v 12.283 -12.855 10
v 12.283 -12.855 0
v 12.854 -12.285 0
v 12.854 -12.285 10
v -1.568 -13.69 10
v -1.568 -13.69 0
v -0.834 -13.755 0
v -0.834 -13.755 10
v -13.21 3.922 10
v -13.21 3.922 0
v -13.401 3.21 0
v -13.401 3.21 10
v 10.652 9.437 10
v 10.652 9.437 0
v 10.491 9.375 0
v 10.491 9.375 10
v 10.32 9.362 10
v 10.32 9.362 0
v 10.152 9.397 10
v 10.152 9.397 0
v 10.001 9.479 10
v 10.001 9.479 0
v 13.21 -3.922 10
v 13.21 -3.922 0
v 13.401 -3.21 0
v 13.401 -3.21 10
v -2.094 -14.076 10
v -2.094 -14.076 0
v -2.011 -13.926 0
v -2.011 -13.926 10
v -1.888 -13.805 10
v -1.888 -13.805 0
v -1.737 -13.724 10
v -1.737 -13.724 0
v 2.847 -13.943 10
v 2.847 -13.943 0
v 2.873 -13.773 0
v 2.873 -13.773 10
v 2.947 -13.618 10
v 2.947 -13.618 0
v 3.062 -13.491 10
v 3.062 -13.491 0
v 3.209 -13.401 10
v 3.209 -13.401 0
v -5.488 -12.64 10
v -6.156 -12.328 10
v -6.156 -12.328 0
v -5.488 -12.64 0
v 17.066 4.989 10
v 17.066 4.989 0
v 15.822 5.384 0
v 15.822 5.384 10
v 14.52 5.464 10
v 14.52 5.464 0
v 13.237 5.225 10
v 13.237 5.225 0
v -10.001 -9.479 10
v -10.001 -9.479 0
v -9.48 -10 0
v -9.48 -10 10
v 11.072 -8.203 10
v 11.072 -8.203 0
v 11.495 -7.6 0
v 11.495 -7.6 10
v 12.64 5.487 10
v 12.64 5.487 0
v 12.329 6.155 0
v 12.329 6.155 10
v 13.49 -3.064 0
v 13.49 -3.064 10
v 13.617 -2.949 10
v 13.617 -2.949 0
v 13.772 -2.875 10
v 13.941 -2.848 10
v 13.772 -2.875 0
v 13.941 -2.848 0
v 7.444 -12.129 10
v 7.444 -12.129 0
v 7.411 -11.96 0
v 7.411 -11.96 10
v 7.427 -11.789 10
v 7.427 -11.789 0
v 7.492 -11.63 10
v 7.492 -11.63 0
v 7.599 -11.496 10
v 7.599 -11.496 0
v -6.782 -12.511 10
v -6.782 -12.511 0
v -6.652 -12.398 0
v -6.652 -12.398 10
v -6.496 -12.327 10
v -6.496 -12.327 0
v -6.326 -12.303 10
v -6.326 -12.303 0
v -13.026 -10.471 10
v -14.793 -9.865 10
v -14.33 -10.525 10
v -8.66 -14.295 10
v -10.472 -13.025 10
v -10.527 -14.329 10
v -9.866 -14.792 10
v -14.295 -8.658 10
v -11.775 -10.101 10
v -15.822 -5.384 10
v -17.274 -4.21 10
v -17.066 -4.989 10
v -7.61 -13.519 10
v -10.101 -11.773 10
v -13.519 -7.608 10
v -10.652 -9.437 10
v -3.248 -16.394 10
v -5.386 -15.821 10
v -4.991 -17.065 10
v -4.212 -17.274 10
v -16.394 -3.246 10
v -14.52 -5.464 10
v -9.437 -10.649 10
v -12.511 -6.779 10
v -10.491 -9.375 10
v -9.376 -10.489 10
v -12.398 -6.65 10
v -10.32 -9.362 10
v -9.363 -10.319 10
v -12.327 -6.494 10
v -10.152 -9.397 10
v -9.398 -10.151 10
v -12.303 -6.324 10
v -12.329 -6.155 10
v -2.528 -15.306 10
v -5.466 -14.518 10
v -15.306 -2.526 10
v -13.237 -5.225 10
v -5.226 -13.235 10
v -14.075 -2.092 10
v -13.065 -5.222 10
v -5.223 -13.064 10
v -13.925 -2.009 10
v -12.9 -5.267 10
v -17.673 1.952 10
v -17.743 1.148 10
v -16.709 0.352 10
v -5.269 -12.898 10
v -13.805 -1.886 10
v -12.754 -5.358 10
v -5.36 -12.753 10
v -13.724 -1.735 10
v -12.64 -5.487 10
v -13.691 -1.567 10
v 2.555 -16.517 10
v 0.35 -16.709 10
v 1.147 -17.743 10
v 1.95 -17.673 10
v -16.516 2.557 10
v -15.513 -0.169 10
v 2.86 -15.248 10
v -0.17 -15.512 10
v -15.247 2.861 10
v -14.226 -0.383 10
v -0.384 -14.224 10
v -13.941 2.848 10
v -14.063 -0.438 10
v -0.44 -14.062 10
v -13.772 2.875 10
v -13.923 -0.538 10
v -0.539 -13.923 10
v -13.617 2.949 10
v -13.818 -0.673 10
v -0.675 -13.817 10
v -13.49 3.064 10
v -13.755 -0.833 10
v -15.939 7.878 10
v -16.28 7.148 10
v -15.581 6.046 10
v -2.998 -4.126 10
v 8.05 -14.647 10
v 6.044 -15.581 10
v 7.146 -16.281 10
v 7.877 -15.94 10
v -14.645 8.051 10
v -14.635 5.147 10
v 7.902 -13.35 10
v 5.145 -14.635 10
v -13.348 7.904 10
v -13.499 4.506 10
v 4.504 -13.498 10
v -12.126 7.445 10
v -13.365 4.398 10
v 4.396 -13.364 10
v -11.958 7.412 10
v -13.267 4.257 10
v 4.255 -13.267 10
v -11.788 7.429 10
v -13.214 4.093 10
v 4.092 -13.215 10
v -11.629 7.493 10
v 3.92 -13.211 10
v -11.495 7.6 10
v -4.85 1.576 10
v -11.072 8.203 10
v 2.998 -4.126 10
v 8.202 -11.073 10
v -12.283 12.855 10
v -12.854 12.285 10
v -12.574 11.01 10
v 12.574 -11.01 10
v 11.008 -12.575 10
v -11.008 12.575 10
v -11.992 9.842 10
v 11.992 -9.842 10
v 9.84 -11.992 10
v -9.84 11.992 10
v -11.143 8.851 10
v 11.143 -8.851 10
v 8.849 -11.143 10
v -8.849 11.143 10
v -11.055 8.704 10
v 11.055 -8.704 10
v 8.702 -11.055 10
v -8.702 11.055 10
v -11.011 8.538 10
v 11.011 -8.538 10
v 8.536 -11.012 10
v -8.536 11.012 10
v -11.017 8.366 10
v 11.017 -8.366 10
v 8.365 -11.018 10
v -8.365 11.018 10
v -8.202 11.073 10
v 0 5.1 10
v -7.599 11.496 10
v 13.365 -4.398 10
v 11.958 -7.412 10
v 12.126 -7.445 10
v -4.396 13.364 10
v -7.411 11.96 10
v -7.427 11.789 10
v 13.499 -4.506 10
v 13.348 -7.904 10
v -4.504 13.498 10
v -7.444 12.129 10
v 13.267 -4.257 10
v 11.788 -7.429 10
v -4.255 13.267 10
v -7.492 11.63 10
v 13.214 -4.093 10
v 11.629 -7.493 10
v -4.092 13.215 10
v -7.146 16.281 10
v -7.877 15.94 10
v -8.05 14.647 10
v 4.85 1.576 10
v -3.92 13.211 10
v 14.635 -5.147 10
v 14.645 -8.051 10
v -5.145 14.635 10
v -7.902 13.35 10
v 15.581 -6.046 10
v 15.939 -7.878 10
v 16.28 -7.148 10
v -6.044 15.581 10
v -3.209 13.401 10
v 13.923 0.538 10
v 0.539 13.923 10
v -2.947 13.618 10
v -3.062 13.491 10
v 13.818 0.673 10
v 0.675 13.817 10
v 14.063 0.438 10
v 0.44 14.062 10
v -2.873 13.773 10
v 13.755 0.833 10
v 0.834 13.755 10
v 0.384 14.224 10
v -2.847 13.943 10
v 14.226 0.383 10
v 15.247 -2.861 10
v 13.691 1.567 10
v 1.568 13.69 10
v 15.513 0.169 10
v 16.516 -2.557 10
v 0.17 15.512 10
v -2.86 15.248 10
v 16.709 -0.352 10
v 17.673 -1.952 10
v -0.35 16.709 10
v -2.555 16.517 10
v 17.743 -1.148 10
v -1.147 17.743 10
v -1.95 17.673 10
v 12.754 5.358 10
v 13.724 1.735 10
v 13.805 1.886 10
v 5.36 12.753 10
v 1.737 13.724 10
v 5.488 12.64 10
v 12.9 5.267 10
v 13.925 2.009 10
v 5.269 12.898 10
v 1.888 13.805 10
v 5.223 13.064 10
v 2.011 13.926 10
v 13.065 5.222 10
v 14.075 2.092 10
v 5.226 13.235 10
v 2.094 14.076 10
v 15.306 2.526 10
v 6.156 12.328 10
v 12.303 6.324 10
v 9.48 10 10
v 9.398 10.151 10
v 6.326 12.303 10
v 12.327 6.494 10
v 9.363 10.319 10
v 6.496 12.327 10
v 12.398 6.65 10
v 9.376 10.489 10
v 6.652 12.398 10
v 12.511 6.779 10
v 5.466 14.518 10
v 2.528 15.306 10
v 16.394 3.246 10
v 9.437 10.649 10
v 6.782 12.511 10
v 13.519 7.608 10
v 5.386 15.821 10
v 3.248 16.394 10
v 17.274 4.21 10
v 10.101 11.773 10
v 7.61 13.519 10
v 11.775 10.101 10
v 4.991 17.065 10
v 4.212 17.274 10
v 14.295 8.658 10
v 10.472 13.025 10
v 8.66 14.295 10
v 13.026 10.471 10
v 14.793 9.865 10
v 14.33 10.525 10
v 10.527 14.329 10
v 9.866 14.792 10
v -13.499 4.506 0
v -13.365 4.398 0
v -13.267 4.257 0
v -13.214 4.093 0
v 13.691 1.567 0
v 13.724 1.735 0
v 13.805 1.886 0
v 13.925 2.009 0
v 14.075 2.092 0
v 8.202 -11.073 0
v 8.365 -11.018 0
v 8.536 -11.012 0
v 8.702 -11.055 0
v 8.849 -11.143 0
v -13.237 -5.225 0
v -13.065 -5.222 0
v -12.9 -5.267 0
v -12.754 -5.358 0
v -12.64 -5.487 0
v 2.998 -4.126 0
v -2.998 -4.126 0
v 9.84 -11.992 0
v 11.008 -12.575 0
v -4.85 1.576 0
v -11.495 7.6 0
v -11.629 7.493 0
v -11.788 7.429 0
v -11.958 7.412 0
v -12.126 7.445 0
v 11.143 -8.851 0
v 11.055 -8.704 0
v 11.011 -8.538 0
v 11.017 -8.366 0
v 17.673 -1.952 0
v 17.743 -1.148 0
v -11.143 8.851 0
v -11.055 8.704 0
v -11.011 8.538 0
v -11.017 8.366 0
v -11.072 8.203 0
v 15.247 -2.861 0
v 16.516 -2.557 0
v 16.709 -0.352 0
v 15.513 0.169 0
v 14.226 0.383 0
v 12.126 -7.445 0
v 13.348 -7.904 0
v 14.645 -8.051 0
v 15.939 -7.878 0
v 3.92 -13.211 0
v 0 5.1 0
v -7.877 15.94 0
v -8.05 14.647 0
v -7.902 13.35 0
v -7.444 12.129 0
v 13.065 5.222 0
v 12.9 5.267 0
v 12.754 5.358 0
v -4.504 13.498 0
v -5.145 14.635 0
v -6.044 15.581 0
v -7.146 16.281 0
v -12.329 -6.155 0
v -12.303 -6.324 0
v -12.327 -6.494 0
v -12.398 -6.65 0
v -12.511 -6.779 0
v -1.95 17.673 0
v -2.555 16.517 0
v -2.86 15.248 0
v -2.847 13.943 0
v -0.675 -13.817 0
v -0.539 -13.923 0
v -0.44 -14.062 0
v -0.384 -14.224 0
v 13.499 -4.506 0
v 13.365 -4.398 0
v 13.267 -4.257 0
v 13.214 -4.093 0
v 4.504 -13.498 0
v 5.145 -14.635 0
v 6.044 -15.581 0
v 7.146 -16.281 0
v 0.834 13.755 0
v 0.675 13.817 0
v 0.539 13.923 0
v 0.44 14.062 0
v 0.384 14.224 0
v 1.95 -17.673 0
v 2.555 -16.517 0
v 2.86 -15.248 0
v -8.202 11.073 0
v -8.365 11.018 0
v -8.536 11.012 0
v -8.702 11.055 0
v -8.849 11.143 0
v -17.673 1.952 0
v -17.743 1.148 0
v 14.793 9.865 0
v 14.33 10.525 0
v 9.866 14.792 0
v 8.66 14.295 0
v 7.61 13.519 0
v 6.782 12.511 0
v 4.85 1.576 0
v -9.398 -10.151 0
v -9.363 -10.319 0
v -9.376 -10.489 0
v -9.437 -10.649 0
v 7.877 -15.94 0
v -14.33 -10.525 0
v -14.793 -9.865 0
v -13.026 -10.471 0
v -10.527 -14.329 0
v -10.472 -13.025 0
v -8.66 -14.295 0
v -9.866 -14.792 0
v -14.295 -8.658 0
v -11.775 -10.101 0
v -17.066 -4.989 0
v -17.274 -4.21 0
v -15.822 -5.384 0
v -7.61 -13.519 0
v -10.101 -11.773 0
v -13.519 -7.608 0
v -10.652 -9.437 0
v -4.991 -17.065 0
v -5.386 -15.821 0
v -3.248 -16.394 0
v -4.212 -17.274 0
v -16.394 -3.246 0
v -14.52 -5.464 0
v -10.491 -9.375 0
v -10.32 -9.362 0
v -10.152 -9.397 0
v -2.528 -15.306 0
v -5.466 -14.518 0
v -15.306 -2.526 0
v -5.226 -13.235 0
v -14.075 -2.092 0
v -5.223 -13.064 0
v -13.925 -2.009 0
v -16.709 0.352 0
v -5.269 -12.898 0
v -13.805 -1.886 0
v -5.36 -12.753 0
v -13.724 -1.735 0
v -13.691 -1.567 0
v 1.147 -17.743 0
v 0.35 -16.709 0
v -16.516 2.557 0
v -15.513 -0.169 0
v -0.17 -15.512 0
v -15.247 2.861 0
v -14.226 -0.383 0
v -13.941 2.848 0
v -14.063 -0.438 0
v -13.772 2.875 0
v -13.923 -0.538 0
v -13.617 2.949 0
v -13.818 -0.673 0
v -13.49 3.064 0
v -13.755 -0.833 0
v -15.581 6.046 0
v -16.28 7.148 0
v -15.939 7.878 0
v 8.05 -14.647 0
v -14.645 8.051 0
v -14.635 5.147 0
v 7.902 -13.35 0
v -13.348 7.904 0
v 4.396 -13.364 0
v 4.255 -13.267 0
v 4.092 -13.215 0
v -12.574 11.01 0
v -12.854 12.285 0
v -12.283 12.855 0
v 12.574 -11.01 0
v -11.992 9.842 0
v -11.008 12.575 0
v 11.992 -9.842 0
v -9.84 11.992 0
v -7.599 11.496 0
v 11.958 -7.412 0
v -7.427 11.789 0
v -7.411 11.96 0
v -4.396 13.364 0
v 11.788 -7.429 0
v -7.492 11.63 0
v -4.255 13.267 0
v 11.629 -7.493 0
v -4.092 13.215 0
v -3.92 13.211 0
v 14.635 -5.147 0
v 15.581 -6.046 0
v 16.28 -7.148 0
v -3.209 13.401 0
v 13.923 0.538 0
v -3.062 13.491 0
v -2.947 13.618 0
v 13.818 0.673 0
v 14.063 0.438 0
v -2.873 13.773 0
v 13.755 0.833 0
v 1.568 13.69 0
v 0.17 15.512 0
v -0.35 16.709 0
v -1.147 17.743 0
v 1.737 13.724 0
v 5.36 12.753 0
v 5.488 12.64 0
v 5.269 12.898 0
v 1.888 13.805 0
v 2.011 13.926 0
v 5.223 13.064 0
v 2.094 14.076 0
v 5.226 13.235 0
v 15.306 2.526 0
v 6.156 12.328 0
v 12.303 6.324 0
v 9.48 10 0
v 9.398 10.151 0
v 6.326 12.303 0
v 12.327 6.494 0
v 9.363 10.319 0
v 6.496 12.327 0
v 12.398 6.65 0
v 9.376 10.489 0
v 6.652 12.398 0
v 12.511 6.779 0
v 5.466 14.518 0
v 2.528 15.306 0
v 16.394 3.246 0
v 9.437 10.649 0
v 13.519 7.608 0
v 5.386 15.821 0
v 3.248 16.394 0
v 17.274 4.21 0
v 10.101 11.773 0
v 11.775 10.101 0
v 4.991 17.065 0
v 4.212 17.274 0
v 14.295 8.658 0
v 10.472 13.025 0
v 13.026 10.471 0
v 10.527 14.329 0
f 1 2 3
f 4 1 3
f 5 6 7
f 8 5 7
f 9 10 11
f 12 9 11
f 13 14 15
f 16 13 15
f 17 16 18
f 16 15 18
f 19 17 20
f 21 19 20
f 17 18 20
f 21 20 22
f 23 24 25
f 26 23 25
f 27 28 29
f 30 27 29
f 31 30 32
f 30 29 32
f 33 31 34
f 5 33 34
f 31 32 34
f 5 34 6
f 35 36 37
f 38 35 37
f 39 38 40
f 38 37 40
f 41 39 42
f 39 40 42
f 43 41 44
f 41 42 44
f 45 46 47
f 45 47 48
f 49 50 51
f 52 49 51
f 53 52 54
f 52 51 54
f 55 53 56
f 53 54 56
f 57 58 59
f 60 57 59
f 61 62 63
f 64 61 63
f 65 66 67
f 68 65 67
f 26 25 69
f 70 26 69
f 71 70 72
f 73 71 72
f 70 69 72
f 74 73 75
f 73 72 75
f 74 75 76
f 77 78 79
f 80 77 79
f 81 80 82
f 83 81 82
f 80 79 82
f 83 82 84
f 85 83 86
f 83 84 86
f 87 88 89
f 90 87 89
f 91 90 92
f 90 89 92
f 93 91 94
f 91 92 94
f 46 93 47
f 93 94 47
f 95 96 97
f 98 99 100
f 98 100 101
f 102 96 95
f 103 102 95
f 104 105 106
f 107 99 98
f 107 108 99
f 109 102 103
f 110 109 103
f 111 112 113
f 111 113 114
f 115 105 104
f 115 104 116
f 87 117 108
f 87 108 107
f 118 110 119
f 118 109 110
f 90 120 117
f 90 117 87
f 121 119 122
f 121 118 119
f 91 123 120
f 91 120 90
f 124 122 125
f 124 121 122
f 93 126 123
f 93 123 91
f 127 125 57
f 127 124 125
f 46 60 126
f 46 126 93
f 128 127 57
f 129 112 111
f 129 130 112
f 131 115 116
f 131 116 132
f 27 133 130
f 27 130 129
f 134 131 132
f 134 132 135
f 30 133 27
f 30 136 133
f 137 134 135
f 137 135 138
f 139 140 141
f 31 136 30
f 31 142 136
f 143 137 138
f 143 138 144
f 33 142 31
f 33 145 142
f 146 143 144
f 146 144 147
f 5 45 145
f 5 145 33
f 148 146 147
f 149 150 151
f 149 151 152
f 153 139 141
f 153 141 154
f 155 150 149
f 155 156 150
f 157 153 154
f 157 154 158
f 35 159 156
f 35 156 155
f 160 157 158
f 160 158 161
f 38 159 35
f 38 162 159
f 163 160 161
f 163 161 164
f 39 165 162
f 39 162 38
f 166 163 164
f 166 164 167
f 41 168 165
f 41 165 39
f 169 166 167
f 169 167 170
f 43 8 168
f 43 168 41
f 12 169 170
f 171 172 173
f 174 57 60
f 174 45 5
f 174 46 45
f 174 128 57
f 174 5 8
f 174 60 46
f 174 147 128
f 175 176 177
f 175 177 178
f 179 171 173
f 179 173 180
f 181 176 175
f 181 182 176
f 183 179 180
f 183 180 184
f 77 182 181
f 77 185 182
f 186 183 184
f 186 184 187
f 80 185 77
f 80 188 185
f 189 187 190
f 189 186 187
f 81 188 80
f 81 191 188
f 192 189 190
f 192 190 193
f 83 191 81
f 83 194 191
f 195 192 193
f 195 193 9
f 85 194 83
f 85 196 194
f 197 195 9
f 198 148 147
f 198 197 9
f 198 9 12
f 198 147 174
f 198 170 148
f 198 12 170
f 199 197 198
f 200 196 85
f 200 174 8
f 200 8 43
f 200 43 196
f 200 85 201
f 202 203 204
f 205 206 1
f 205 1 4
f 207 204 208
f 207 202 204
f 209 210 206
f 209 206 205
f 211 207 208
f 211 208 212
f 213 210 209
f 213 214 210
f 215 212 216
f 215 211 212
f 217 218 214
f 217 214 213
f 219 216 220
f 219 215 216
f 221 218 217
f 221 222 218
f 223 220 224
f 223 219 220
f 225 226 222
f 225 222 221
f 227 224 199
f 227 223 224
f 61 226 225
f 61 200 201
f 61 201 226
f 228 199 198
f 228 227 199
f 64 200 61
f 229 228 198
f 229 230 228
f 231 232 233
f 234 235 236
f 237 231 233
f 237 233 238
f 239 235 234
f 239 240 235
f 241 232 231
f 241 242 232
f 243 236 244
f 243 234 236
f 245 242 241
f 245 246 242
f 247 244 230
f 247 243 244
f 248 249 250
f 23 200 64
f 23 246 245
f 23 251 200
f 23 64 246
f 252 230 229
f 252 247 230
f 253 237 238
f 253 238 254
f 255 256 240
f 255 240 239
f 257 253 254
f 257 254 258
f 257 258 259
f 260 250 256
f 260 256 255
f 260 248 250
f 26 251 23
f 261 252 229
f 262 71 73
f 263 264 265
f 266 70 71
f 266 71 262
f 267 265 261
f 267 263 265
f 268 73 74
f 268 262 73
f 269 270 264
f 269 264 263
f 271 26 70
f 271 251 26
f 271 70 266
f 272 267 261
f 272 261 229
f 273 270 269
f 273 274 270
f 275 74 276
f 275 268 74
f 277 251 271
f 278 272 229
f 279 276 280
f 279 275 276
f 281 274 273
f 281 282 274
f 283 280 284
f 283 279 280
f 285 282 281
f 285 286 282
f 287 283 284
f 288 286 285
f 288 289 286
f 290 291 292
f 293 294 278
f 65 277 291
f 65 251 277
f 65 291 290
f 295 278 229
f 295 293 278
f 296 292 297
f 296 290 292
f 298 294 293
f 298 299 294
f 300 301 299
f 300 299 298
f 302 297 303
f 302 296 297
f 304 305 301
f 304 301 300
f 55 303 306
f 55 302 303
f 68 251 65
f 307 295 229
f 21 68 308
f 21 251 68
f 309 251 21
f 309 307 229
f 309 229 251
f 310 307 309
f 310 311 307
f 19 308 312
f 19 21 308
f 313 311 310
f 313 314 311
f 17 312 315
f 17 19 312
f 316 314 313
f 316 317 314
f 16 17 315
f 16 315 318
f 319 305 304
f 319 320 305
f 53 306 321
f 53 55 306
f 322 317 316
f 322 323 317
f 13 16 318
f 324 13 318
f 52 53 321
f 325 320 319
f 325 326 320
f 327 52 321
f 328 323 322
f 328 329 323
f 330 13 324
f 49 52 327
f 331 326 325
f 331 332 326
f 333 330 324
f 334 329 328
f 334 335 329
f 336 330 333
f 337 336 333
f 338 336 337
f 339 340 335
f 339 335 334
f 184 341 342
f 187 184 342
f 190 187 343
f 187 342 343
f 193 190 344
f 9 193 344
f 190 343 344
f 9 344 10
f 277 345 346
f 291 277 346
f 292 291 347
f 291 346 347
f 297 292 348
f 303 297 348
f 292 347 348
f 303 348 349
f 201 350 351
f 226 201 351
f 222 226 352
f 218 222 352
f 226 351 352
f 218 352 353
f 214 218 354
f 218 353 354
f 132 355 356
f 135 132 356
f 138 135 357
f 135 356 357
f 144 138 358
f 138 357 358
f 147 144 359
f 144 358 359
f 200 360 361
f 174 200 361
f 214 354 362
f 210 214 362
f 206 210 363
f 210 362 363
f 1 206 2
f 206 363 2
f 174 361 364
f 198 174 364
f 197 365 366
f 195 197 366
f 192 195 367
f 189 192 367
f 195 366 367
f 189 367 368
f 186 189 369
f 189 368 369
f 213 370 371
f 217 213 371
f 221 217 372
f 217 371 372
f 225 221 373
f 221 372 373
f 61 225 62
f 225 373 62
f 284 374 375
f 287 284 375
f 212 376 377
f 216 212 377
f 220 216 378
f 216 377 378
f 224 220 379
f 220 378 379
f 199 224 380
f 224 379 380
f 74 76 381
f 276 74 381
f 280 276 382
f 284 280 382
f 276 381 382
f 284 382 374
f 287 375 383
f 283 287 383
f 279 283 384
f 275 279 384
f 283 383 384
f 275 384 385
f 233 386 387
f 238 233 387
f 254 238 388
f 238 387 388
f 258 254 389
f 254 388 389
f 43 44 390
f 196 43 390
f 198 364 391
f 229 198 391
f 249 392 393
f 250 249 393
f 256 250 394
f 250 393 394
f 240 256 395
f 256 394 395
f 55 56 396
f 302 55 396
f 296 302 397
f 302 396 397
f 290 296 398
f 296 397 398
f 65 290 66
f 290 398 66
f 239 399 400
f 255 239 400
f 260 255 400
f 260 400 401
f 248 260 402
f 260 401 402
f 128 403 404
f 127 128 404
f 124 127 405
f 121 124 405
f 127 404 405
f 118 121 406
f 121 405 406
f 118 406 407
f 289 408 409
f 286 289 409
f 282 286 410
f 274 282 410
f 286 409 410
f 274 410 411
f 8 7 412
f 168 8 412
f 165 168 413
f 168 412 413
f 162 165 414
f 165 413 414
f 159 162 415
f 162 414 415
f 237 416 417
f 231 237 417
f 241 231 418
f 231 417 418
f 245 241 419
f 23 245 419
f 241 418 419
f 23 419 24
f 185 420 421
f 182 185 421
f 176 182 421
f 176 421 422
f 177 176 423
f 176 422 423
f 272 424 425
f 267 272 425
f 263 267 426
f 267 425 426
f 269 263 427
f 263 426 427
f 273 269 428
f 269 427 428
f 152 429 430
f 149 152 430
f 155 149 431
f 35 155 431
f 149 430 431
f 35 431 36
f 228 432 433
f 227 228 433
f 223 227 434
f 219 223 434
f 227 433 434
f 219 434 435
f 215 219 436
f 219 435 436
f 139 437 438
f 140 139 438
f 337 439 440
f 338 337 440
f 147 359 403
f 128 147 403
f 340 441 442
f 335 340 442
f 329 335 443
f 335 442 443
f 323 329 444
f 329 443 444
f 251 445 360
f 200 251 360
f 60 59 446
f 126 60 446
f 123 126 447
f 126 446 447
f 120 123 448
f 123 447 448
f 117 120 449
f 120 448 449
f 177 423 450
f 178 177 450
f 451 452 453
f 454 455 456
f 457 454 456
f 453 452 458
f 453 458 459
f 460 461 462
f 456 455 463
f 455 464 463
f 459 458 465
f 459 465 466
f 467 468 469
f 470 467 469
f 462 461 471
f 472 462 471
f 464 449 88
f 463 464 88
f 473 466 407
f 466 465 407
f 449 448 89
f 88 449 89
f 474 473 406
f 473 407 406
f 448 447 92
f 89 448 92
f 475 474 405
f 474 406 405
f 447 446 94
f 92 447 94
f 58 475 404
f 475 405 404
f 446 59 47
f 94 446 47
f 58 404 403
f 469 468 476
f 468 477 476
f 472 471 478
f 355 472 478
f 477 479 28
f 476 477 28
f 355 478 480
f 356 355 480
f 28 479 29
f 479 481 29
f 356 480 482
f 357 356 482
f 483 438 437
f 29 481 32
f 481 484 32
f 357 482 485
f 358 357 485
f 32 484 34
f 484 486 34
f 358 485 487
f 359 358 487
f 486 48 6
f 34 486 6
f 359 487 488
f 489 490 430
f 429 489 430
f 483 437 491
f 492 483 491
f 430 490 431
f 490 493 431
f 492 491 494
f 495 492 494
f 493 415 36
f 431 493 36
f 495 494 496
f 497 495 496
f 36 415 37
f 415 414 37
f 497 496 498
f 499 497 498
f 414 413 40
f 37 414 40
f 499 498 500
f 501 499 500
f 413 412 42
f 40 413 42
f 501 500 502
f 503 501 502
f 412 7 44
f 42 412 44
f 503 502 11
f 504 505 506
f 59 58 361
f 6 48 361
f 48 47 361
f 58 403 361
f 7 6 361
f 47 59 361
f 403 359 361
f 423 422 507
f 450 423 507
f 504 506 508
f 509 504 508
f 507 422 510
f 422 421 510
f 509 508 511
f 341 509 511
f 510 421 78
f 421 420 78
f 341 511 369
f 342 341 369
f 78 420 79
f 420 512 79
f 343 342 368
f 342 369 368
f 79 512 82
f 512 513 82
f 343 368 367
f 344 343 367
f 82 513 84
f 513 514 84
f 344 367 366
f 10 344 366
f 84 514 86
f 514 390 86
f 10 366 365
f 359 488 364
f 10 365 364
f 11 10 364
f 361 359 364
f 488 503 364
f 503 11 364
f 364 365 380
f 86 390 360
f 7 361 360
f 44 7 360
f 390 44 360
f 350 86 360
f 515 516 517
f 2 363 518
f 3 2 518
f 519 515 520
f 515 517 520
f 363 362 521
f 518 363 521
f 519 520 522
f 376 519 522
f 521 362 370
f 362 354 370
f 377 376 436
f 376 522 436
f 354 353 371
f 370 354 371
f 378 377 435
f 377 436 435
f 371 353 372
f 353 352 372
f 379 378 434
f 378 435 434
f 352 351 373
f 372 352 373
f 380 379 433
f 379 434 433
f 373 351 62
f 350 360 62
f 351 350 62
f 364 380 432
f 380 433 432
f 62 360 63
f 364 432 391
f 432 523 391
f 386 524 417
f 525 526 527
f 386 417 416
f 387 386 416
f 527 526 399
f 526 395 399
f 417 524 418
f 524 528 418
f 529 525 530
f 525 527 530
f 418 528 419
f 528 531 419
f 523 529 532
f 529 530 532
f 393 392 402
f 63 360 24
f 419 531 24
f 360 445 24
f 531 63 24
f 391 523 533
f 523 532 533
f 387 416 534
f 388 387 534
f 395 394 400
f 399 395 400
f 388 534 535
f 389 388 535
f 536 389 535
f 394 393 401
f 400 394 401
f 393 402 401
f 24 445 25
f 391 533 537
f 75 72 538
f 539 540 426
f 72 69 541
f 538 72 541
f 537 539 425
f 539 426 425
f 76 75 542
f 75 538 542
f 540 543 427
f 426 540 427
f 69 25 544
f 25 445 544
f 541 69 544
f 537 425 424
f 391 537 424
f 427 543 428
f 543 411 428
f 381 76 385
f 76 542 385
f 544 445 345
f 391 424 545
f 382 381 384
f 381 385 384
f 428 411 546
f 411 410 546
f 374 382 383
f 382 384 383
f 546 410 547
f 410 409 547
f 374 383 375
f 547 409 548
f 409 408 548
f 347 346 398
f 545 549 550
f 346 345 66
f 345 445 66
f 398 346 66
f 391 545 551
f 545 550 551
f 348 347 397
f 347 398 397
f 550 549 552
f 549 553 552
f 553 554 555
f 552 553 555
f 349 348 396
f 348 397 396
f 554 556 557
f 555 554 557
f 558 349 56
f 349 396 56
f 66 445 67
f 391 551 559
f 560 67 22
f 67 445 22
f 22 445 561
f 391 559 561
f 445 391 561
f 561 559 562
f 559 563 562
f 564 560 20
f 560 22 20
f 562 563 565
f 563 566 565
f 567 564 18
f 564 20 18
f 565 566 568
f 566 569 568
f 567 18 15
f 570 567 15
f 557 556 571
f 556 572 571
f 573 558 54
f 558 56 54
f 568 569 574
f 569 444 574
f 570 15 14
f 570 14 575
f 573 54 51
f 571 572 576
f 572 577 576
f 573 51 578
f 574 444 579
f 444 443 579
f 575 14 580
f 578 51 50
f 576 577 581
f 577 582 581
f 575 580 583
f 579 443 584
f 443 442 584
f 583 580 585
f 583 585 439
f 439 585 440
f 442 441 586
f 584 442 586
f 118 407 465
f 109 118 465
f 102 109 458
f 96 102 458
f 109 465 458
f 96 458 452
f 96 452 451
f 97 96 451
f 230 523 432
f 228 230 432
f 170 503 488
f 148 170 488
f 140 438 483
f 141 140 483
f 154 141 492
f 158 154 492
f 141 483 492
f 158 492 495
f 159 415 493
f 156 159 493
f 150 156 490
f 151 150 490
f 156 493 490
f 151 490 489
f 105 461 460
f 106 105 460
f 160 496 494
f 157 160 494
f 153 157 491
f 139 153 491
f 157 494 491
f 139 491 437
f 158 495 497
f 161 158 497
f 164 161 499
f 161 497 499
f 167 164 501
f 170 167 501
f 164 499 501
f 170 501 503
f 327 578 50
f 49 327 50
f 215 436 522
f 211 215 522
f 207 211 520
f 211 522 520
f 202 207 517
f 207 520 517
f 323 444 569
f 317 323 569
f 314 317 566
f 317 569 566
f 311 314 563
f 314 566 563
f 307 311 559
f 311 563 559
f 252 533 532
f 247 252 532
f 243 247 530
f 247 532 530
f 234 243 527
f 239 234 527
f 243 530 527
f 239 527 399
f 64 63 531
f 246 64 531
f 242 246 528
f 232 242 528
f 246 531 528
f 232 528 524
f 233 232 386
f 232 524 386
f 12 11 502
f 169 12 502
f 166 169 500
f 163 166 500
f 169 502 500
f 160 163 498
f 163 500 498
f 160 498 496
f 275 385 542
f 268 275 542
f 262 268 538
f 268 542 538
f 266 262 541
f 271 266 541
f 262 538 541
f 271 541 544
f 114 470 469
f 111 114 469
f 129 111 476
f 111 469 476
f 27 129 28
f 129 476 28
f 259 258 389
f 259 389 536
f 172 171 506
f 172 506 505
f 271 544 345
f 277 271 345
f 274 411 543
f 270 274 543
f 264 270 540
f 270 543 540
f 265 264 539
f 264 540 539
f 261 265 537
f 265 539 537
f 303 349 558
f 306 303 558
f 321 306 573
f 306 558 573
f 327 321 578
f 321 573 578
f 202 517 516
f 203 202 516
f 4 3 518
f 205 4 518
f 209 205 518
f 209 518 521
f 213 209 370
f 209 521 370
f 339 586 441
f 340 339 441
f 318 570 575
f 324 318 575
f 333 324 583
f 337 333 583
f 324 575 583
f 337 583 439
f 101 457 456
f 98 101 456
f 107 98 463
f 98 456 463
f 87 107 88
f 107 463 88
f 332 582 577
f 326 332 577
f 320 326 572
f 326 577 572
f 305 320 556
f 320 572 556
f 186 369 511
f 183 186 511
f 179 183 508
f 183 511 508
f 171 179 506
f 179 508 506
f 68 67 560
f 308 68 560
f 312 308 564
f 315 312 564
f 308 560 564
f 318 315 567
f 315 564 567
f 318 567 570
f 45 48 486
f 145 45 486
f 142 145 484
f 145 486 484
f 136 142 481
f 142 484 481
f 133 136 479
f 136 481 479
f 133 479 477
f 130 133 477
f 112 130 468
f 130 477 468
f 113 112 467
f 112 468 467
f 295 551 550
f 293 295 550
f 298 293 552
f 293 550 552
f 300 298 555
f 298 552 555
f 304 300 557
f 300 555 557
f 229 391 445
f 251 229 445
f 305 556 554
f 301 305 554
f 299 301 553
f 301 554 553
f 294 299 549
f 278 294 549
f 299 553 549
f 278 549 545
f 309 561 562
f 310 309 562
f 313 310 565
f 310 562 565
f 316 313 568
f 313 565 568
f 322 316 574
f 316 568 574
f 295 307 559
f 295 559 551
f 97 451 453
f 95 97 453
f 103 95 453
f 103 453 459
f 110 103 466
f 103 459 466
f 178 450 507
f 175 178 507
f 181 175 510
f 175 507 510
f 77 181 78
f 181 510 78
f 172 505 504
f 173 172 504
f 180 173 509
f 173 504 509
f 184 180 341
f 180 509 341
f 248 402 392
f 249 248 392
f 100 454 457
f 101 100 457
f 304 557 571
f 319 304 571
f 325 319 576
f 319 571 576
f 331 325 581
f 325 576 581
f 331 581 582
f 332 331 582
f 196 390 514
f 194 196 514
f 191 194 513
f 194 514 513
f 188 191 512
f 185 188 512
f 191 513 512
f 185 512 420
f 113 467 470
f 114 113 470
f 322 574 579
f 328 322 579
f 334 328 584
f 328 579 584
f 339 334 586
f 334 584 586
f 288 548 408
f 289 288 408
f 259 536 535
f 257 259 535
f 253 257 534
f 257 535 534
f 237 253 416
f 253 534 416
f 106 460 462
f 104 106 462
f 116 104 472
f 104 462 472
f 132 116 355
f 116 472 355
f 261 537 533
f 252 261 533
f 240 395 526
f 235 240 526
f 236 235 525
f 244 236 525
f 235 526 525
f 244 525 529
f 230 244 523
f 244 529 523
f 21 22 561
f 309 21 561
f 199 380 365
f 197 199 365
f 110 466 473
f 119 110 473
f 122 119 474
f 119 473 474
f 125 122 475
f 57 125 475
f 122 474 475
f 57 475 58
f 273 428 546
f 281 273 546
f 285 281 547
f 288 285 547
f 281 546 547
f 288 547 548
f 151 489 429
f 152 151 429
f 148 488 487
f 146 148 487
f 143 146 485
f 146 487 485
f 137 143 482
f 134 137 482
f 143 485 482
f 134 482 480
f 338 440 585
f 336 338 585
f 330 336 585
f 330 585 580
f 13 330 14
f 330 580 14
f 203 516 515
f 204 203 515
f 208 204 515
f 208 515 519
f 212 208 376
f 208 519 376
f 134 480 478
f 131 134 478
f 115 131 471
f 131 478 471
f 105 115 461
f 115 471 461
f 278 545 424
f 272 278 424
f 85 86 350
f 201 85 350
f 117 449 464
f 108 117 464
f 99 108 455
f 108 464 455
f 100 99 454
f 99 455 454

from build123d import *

# Parameters (mm, degrees)
F1_DEPTH = 10


with BuildPart() as f1:
    # F0 (on Top) → F1 (new body)
    with BuildSketch(Plane.XY):
        with BuildLine():
            ThreePointArc((0.834247, 13.754724), (0.539473, 13.922611), (0.384061, 14.224148))
            ThreePointArc((0.384061, 14.224148), (-0.053041, 16.126356), (-1.146638, 17.742988))
            Line((-1.146638, 17.742988), (-1.950006, 17.672744))
            ThreePointArc((-1.950006, 17.672744), (-2.74627, 15.891587), (-2.846993, 13.943148))
            ThreePointArc((-2.846993, 13.943148), (-2.94723, 13.618388), (-3.20868, 13.401223))
            Line((-3.20868, 13.401223), (-3.920457, 13.210542))
            ThreePointArc((-3.920457, 13.210542), (-4.254874, 13.267486), (-4.504046, 13.497684))
            ThreePointArc((-4.504046, 13.497684), (-5.565381, 15.135677), (-7.145946, 16.280782))
            Line((-7.145946, 16.280782), (-7.876841, 15.940006))
            ThreePointArc((-7.876841, 15.940006), (-8.015892, 13.993927), (-7.444136, 12.128545))
            ThreePointArc((-7.444136, 12.128545), (-7.427254, 11.789086), (-7.598661, 11.495597))
            Line((-7.598661, 11.495597), (-8.202296, 11.072974))
            ThreePointArc((-8.202296, 11.072974), (-8.536021, 11.012106), (-8.848898, 11.1432))
            ThreePointArc((-8.848898, 11.1432), (-10.406453, 12.319412), (-12.283348, 12.854873))
            Line((-12.283348, 12.854873), (-12.853612, 12.284668))
            ThreePointArc((-12.853612, 12.284668), (-12.31868, 10.408393), (-11.143406, 8.85106))
            ThreePointArc((-11.143406, 8.85106), (-11.01144, 8.537847), (-11.072132, 8.203432))
            Line((-11.072132, 8.203432), (-11.494817, 7.599841))
            ThreePointArc((-11.494817, 7.599841), (-11.787598, 7.428503), (-12.126443, 7.444681))
            ThreePointArc((-12.126443, 7.444681), (-13.992354, 8.017243), (-15.939197, 7.878477))
            Line((-15.939197, 7.878477), (-16.280048, 7.147617))
            ThreePointArc((-16.280048, 7.147617), (-15.135653, 5.567454), (-13.498617, 4.506006))
            ThreePointArc((-13.498617, 4.506006), (-13.267485, 4.256818), (-13.21014, 3.921813))
            Line((-13.21014, 3.921813), (-13.400893, 3.210056))
            ThreePointArc((-13.400893, 3.210056), (-13.617417, 2.948914), (-13.94136, 2.848224))
            ThreePointArc((-13.94136, 2.848224), (-15.890571, 2.748077), (-17.672544, 1.95182))
            Line((-17.672544, 1.95182), (-17.74287, 1.148459))
            ThreePointArc((-17.74287, 1.148459), (-16.127043, 0.054997), (-14.225696, -0.382538))
            ThreePointArc((-14.225696, -0.382538), (-13.923275, -0.537647), (-13.75481, -0.832836))
            Line((-13.75481, -0.832836), (-13.690624, -1.566909))
            ThreePointArc((-13.690624, -1.566909), (-13.804774, -1.886358), (-14.074743, -2.091771))
            ThreePointArc((-14.074743, -2.091771), (-15.87215, -2.852547), (-17.274321, -4.210255))
            Line((-17.274321, -4.210255), (-17.06564, -4.989221))
            ThreePointArc((-17.06564, -4.989221), (-15.173273, -5.464093), (-13.236946, -5.224943))
            ThreePointArc((-13.236946, -5.224943), (-12.899713, -5.267264), (-12.640446, -5.487031))
            Line((-12.640446, -5.487031), (-12.329064, -6.154883))
            ThreePointArc((-12.329064, -6.154883), (-12.327072, -6.494108), (-12.510505, -6.779467))
            ThreePointArc((-12.510505, -6.779467), (-13.939314, -8.109113), (-14.79256, -9.864511))
            Line((-14.79256, -9.864511), (-14.330042, -10.525127))
            ThreePointArc((-14.330042, -10.525127), (-12.389383, -10.324133), (-10.651624, -9.437142))
            ThreePointArc((-10.651624, -9.437142), (-10.320255, -9.36157), (-10.001459, -9.47941))
            Line((-10.001459, -9.47941), (-9.480437, -10.000486))
            ThreePointArc((-9.480437, -10.000486), (-9.362542, -10.318572), (-9.437314, -10.64946))
            ThreePointArc((-9.437314, -10.64946), (-10.32519, -12.387599), (-10.526598, -14.328962))
            Line((-10.526598, -14.328962), (-9.86603, -14.791547))
            ThreePointArc((-9.86603, -14.791547), (-8.11115, -13.93893), (-6.78156, -12.511083))
            ThreePointArc((-6.78156, -12.511083), (-6.496022, -12.326734), (-6.156148, -12.328432))
            Line((-6.156148, -12.328432), (-5.488329, -12.639883))
            ThreePointArc((-5.488329, -12.639883), (-5.268753, -12.898464), (-5.225845, -13.234971))
            ThreePointArc((-5.225845, -13.234971), (-5.465697, -15.171959), (-4.990972, -17.065128))
            Line((-4.990972, -17.065128), (-4.212028, -17.273888))
            ThreePointArc((-4.212028, -17.273888), (-2.854593, -15.872486), (-2.093539, -14.076003))
            ThreePointArc((-2.093539, -14.076003), (-1.888272, -13.805111), (-1.568315, -13.690463))
            Line((-1.568315, -13.690463), (-0.834247, -13.754724))
            ThreePointArc((-0.834247, -13.754724), (-0.539473, -13.922611), (-0.384061, -14.224148))
            ThreePointArc((-0.384061, -14.224148), (0.053041, -16.126356), (1.146638, -17.742988))
            Line((1.146638, -17.742988), (1.950006, -17.672744))
            ThreePointArc((1.950006, -17.672744), (2.74627, -15.891587), (2.846993, -13.943148))
            ThreePointArc((2.846993, -13.943148), (2.94723, -13.618388), (3.20868, -13.401223))
            Line((3.20868, -13.401223), (3.920457, -13.210542))
            ThreePointArc((3.920457, -13.210542), (4.254874, -13.267486), (4.504046, -13.497684))
            ThreePointArc((4.504046, -13.497684), (5.565381, -15.135677), (7.145946, -16.280782))
            Line((7.145946, -16.280782), (7.876841, -15.940006))
            ThreePointArc((7.876841, -15.940006), (8.015892, -13.993927), (7.444136, -12.128545))
            ThreePointArc((7.444136, -12.128545), (7.427254, -11.789086), (7.598661, -11.495597))
            Line((7.598661, -11.495597), (8.202296, -11.072974))
            ThreePointArc((8.202296, -11.072974), (8.536021, -11.012106), (8.848898, -11.1432))
            ThreePointArc((8.848898, -11.1432), (10.406453, -12.319412), (12.283348, -12.854873))
            Line((12.283348, -12.854873), (12.853612, -12.284668))
            ThreePointArc((12.853612, -12.284668), (12.31868, -10.408393), (11.143406, -8.85106))
            ThreePointArc((11.143406, -8.85106), (11.01144, -8.537847), (11.072132, -8.203432))
            Line((11.072132, -8.203432), (11.494817, -7.599841))
            ThreePointArc((11.494817, -7.599841), (11.787598, -7.428503), (12.126443, -7.444681))
            ThreePointArc((12.126443, -7.444681), (13.992354, -8.017243), (15.939197, -7.878477))
            Line((15.939197, -7.878477), (16.280048, -7.147617))
            ThreePointArc((16.280048, -7.147617), (15.135653, -5.567454), (13.498617, -4.506006))
            ThreePointArc((13.498617, -4.506006), (13.267485, -4.256818), (13.21014, -3.921813))
            Line((13.21014, -3.921813), (13.400893, -3.210056))
            ThreePointArc((13.400893, -3.210056), (13.617417, -2.948914), (13.94136, -2.848224))
            ThreePointArc((13.94136, -2.848224), (15.890571, -2.748077), (17.672544, -1.95182))
            Line((17.672544, -1.95182), (17.74287, -1.148459))
            ThreePointArc((17.74287, -1.148459), (16.127043, -0.054997), (14.225696, 0.382538))
            ThreePointArc((14.225696, 0.382538), (13.923275, 0.537647), (13.75481, 0.832836))
            Line((13.75481, 0.832836), (13.690624, 1.566909))
            ThreePointArc((13.690624, 1.566909), (13.804774, 1.886358), (14.074743, 2.091771))
            ThreePointArc((14.074743, 2.091771), (15.87215, 2.852547), (17.274321, 4.210255))
            Line((17.274321, 4.210255), (17.06564, 4.989221))
            ThreePointArc((17.06564, 4.989221), (15.173273, 5.464093), (13.236946, 5.224943))
            ThreePointArc((13.236946, 5.224943), (12.899713, 5.267264), (12.640446, 5.487031))
            Line((12.640446, 5.487031), (12.329064, 6.154883))
            ThreePointArc((12.329064, 6.154883), (12.327072, 6.494108), (12.510505, 6.779467))
            ThreePointArc((12.510505, 6.779467), (13.939314, 8.109113), (14.79256, 9.864511))
            Line((14.79256, 9.864511), (14.330042, 10.525127))
            ThreePointArc((14.330042, 10.525127), (12.389383, 10.324133), (10.651624, 9.437142))
            ThreePointArc((10.651624, 9.437142), (10.320255, 9.36157), (10.001459, 9.47941))
            Line((10.001459, 9.47941), (9.480437, 10.000486))
            ThreePointArc((9.480437, 10.000486), (9.362542, 10.318572), (9.437314, 10.64946))
            ThreePointArc((9.437314, 10.64946), (10.32519, 12.387599), (10.526598, 14.328962))
            Line((10.526598, 14.328962), (9.86603, 14.791547))
            ThreePointArc((9.86603, 14.791547), (8.11115, 13.93893), (6.78156, 12.511083))
            ThreePointArc((6.78156, 12.511083), (6.496022, 12.326734), (6.156148, 12.328432))
            Line((6.156148, 12.328432), (5.488329, 12.639883))
            ThreePointArc((5.488329, 12.639883), (5.268753, 12.898464), (5.225845, 13.234971))
            ThreePointArc((5.225845, 13.234971), (5.465697, 15.171959), (4.990972, 17.065128))
            Line((4.990972, 17.065128), (4.212028, 17.273888))
            ThreePointArc((4.212028, 17.273888), (2.854593, 15.872486), (2.093539, 14.076003))
            ThreePointArc((2.093539, 14.076003), (1.888272, 13.805111), (1.568315, 13.690463))
            Line((1.568315, 13.690463), (0.834247, 13.754724))
        make_face()
        Polygon((0, 5.1), (4.850388, 1.575987), (2.997705, -4.125987), (-2.997705, -4.125987), (-4.850388, 1.575987), align=None, mode=Mode.SUBTRACT)
    extrude(amount=F1_DEPTH)


solid = f1.part
